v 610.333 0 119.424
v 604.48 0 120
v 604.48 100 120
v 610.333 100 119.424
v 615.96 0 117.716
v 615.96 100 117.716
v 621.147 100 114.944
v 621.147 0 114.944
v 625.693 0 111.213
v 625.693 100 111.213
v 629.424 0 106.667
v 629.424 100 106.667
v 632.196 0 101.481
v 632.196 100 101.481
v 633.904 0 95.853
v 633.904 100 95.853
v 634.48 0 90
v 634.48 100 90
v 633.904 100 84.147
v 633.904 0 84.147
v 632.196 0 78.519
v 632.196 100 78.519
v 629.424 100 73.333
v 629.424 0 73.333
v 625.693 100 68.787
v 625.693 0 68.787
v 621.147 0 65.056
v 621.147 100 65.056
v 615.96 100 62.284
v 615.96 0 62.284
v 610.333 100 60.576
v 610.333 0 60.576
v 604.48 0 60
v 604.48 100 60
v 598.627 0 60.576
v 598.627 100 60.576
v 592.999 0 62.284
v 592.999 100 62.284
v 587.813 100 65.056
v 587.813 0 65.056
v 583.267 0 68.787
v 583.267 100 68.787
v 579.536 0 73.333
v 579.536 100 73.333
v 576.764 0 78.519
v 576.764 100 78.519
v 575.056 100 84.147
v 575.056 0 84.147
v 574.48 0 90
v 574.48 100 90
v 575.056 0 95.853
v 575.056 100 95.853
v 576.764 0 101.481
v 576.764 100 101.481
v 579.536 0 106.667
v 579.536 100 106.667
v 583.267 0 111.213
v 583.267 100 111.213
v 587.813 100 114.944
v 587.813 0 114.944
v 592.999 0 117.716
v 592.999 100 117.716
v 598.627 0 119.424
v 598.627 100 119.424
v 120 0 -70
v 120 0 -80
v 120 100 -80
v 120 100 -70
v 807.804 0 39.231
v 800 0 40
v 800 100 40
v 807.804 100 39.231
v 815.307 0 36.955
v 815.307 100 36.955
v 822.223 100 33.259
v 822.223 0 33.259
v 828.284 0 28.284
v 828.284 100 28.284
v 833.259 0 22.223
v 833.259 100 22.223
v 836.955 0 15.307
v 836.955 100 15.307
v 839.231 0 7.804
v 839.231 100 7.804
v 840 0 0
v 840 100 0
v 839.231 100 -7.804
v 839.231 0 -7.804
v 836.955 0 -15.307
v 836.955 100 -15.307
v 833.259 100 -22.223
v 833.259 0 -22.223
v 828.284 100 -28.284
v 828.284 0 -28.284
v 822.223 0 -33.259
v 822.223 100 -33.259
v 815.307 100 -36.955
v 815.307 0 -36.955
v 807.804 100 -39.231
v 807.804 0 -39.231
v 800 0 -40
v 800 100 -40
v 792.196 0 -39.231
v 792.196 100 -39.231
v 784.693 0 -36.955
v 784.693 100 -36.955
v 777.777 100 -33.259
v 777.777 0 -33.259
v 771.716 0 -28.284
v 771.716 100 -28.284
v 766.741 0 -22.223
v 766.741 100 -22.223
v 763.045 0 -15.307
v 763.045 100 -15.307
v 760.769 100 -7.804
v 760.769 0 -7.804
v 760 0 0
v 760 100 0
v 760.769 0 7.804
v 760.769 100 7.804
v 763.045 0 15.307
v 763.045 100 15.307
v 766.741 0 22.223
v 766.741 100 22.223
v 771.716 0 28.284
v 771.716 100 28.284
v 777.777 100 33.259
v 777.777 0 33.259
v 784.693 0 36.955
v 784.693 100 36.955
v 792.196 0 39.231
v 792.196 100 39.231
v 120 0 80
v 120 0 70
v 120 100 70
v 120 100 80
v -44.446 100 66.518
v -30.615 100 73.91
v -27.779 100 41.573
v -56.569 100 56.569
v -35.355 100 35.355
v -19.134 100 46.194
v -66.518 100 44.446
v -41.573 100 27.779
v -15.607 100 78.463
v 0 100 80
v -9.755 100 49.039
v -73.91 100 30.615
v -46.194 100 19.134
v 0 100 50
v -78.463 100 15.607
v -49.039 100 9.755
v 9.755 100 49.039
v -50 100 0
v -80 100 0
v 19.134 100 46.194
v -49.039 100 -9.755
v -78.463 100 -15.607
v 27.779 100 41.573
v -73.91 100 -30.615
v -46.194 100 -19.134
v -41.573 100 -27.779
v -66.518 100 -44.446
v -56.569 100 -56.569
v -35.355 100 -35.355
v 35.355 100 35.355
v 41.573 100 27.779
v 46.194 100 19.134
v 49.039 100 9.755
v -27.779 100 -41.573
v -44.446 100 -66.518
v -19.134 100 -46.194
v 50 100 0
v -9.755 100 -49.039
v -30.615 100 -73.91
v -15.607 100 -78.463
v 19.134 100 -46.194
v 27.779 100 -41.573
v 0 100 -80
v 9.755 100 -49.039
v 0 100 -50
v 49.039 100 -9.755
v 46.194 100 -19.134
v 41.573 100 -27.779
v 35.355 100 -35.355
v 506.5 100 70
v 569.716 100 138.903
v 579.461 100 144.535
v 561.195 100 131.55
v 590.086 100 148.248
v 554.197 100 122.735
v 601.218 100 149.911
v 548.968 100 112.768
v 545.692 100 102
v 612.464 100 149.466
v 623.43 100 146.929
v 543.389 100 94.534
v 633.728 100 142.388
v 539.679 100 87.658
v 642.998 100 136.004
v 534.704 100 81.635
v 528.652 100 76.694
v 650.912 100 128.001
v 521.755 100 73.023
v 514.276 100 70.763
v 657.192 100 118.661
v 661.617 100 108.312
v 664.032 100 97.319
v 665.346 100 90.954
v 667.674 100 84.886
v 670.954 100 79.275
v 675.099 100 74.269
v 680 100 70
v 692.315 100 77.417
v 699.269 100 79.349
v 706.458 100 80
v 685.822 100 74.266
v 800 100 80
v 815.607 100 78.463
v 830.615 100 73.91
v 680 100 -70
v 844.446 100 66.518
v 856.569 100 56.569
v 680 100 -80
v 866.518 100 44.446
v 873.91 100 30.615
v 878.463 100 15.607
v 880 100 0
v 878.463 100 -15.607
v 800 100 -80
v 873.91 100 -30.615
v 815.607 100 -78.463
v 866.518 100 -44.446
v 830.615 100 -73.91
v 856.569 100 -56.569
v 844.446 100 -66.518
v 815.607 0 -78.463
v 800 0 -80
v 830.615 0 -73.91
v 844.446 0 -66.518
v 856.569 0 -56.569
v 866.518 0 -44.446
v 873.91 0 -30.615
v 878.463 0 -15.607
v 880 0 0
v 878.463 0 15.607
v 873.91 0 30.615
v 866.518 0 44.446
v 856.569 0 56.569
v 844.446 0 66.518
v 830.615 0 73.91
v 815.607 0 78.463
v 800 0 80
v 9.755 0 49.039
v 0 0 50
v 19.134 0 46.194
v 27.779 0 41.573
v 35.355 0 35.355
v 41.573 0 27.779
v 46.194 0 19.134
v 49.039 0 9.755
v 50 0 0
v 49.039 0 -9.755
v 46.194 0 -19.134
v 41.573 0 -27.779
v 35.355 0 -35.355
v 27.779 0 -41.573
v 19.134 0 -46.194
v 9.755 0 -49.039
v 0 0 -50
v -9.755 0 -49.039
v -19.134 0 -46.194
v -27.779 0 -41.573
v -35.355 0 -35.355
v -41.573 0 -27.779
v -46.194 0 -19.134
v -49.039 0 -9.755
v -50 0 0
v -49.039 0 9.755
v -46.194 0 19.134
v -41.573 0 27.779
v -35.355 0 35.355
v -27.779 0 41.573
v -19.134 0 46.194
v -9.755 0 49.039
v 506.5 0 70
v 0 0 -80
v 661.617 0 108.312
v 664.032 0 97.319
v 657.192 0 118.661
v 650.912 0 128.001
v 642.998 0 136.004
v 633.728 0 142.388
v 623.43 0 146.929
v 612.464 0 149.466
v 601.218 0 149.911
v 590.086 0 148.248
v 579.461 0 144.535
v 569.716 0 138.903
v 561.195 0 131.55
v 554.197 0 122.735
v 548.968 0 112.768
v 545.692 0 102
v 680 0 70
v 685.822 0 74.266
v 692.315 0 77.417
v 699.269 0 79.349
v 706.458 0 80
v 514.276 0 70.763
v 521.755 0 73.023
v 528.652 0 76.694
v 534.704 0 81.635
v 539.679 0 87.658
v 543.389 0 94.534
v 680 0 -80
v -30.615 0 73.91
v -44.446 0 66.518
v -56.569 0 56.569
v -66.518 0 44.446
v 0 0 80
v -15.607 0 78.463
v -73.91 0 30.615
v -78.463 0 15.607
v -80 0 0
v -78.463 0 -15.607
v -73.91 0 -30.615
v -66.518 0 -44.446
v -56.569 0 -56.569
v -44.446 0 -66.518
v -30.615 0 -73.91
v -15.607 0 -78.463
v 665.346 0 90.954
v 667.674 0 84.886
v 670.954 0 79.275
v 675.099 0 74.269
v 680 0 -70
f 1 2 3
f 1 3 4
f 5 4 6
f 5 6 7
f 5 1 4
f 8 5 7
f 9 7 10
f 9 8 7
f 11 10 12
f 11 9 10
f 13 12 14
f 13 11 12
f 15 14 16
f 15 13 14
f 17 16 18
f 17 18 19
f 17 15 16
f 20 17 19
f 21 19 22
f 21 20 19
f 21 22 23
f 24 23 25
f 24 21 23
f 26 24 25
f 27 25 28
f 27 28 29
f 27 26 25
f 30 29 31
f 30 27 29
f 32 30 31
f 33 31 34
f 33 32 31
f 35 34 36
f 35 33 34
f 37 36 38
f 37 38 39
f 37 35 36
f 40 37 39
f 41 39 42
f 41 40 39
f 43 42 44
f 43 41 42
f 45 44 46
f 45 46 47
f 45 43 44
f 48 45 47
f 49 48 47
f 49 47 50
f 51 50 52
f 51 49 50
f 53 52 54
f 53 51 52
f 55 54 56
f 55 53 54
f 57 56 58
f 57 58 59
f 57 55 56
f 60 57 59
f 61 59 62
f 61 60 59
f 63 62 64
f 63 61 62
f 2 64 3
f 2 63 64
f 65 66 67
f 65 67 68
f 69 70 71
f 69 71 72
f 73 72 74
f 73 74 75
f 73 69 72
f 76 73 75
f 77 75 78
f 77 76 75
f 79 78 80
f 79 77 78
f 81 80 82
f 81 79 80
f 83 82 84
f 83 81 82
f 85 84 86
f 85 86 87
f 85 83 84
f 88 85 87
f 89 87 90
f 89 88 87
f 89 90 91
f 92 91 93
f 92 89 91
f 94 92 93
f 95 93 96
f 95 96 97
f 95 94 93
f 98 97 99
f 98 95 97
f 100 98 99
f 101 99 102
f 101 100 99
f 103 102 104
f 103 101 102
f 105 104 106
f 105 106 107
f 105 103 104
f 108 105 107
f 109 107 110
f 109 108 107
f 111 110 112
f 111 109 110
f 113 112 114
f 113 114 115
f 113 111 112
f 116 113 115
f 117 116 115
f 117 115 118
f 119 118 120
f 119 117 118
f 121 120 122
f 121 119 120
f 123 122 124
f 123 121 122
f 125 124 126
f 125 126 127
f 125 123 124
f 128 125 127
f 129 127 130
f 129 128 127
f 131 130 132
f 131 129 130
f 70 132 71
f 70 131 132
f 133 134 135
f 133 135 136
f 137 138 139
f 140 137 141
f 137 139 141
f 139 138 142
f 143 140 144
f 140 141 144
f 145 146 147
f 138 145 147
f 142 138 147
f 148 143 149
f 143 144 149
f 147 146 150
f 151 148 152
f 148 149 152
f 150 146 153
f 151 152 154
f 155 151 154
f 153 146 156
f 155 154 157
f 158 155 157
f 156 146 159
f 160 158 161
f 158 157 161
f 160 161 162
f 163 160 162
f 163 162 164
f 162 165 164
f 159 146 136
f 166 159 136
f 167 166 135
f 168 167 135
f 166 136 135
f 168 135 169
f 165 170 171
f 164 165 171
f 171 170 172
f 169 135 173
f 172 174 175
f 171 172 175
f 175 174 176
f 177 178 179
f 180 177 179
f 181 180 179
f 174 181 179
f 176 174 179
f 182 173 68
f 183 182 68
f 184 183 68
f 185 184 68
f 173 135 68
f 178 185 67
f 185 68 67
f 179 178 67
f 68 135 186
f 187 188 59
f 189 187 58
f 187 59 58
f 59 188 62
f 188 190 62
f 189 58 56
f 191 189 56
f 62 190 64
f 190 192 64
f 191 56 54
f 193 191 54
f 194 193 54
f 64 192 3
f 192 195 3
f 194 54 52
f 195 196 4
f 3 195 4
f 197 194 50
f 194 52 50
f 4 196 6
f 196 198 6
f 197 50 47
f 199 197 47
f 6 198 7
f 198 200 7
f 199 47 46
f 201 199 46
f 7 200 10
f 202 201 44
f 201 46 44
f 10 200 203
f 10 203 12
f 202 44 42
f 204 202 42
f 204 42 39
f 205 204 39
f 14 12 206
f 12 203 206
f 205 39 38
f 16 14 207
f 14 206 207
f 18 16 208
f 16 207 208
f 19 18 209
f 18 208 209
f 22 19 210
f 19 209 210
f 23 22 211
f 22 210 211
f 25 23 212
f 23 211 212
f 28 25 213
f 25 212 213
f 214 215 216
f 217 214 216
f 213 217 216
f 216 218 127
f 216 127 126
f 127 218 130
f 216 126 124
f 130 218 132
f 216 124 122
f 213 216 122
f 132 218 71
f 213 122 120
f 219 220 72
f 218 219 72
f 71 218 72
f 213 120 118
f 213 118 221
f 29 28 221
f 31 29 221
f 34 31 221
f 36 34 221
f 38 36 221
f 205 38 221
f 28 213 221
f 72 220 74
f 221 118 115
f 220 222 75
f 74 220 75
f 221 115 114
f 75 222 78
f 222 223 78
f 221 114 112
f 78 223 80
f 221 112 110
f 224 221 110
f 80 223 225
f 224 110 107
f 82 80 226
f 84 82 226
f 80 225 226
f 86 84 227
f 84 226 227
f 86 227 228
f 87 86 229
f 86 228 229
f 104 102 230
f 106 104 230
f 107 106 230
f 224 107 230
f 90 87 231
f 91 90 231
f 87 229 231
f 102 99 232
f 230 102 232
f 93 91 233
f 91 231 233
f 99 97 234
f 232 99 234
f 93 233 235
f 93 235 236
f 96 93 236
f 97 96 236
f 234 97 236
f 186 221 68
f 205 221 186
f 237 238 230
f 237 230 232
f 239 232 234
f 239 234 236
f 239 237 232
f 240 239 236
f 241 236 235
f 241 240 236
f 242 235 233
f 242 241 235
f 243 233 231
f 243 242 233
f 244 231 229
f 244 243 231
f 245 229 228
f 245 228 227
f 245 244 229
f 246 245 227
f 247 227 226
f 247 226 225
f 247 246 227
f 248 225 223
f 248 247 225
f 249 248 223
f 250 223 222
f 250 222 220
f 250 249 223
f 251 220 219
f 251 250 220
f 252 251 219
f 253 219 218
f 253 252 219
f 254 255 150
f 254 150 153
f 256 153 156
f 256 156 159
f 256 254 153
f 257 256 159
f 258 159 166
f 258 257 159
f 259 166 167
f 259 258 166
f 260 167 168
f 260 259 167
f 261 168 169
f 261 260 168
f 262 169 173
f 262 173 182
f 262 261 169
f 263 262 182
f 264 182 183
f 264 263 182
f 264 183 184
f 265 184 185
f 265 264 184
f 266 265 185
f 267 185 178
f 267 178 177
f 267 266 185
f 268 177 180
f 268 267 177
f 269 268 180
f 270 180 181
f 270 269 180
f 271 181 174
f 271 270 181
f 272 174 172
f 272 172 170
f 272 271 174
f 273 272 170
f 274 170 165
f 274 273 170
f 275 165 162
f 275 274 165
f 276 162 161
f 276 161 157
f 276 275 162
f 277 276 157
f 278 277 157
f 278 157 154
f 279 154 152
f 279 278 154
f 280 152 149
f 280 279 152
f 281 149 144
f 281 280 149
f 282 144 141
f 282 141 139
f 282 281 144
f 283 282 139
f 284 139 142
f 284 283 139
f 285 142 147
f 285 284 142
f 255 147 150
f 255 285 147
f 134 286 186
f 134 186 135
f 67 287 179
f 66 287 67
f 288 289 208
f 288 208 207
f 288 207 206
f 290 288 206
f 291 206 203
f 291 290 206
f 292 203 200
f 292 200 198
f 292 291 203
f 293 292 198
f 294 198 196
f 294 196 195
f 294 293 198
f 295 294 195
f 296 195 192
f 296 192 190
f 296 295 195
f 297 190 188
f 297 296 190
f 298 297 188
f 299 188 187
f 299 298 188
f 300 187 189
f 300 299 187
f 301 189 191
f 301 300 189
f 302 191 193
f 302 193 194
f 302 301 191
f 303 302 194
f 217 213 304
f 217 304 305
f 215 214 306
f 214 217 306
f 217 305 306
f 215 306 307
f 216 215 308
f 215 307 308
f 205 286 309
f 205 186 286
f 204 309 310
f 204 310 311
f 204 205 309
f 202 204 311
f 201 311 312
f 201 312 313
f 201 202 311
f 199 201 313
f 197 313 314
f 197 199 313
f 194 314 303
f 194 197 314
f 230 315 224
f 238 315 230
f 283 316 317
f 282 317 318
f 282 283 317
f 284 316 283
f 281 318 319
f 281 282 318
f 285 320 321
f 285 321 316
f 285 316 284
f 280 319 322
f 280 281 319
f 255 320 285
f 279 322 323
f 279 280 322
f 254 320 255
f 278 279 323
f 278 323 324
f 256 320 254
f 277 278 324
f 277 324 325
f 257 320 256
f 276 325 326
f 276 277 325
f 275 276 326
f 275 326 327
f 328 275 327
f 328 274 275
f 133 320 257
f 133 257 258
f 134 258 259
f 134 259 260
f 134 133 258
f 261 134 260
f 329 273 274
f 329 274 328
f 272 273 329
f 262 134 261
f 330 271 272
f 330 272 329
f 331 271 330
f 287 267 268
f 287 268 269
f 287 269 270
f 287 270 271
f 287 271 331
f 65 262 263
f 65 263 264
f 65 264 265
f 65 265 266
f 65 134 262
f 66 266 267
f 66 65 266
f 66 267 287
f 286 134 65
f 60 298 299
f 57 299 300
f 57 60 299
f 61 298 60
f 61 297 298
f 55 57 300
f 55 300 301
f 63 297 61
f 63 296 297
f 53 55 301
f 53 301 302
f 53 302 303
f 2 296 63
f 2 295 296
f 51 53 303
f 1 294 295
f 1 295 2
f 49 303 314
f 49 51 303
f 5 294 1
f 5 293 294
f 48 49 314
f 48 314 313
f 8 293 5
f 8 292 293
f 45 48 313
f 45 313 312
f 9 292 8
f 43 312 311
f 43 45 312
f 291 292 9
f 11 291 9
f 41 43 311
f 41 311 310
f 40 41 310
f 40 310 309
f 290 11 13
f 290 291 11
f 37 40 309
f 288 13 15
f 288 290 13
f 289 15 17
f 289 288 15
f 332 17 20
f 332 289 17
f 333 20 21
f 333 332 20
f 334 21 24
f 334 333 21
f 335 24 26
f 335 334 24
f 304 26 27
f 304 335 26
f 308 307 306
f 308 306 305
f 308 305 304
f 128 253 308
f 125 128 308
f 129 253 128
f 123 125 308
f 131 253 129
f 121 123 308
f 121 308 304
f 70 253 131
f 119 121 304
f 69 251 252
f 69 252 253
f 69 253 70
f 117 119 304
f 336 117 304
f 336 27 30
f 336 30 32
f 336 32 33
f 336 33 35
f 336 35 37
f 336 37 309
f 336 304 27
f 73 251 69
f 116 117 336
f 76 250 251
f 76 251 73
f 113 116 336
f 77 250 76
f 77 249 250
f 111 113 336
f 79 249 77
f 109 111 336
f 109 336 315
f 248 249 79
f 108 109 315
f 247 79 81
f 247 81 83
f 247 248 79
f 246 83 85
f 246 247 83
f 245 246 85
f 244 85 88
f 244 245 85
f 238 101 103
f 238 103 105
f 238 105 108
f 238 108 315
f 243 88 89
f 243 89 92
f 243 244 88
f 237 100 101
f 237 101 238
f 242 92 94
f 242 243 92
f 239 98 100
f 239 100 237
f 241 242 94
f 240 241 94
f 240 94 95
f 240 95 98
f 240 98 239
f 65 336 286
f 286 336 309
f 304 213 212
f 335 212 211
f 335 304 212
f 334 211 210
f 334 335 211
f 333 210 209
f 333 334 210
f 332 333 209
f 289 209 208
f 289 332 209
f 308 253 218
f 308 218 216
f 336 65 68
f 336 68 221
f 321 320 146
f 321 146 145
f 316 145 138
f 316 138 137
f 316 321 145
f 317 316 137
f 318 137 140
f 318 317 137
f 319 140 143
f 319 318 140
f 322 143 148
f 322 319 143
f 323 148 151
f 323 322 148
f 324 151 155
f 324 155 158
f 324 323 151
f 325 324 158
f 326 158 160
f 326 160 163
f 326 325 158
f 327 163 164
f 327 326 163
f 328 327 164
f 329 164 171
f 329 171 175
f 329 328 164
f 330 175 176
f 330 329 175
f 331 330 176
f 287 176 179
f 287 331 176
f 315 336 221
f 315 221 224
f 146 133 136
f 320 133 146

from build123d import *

# Parameters (mm, degrees)
SKETCH1_R           = 30
SKETCH1_R_2         = 50
SKETCH1_R_3         = 40
BOSS_EXTRUDE1_DEPTH = 100
FILLET1_R           = 40
FILLET2_R           = 40
FILLET3_R           = 40


with BuildPart() as part:
    # Sketch1 → Boss-Extrude1 (new body)
    with BuildSketch(Plane(origin=(0, 0, 0), x_dir=(1, 0, 0), z_dir=(0, 1, 0))):
        with BuildLine():
            Line((0, 80), (120, 80))
            Line((120, 80), (120, 70))
            Line((120, 70), (680, 70))
            Line((680, 70), (680, 80))
            Line((680, 80), (800, 80))
            ThreePointArc((800, 80), (880, 0), (800, -80))
            Line((800, -80), (680, -80))
            Line((680, -80), (680, -70))
            Line((680, -70), (661.048491655, -70))
            ThreePointArc((661.048491655, -70), (604.479949161, -150), (547.911406666, -70))
            Line((547.911406666, -70), (120, -70))
            Line((120, -70), (120, -80))
            Line((120, -80), (0, -80))
            ThreePointArc((0, -80), (-80, 0), (0, 80))
        make_face()
        with Locations(Location((604.479949161, -90, 0), (0, 0, 270))):
            Circle(SKETCH1_R, mode=Mode.SUBTRACT)
        with Locations(Location((0, 0, 0), (0, 0, 270))):
            Circle(SKETCH1_R_2, mode=Mode.SUBTRACT)
        with Locations(Location((800, 0, 0), (0, 0, 270))):
            Circle(SKETCH1_R_3, mode=Mode.SUBTRACT)
    extrude(amount=BOSS_EXTRUDE1_DEPTH)

    # Fillet1
    fillet1_edges = [part.edges().sort_by_distance(p)[0] for p in [
        (547.911406666, 50, 70),
    ]]
    fillet(fillet1_edges, radius=FILLET1_R)

    # Fillet2
    # the kernel refuses this fillet: 40 mm, written as the material it adds along each edge
    with BuildSketch(Plane(origin=(661.048491655, 0, 70), x_dir=(0.10855976910838376, 0, 0.9940899237650156), z_dir=(0, 1, 0))) as fillet2_piece_1:
        with BuildLine():
            CenterArc((36.641948169, 38.936942319), FILLET2_R, 210.161293822, 46.599784771)
            Line((2.05737137, 18.839503485), (1.365679834, 18.437554709))
            ThreePointArc((1.365679834, 18.437554709), (0.233413746, 9.506599558), (-0.795271939, 0.086847815))
            Line((-0.795271939, 0.086847815), (0.183209741, -0.778738846))
            ThreePointArc((0.183209741, -0.778738846), (13.740730563, 0.794586522), (27.298251386, -0.778738846))
            Line((27.298251386, -0.778738846), (27.481461127, 0))
        make_face()
    extrude(amount=100)

    # Fillet3
    # the kernel refuses this fillet: 40 mm, written as the material it takes off along each edge
    with BuildSketch(Plane(origin=(680, -66.143782777, 80), x_dir=(0, 0, -1), z_dir=(0, 1, 0))) as fillet3_piece_1:
        with BuildLine():
            CenterArc((40, -26.457513111), FILLET3_R, 138.590377891, 41.409622109)
            Line((0, -26.457513111), (-0.8, -26.457513111))
            Line((-0.8, -26.457513111), (-0.8, 0))
            Line((-0.8, 0), (0, 0.8))
            ThreePointArc((0, 0.8), (5, 0.8), (9.4, 0.529150262))
            Line((9.4, 0.529150262), (10, 0))
        make_face()
    extrude(amount=232.287565553, mode=Mode.SUBTRACT)


solid = part.part
